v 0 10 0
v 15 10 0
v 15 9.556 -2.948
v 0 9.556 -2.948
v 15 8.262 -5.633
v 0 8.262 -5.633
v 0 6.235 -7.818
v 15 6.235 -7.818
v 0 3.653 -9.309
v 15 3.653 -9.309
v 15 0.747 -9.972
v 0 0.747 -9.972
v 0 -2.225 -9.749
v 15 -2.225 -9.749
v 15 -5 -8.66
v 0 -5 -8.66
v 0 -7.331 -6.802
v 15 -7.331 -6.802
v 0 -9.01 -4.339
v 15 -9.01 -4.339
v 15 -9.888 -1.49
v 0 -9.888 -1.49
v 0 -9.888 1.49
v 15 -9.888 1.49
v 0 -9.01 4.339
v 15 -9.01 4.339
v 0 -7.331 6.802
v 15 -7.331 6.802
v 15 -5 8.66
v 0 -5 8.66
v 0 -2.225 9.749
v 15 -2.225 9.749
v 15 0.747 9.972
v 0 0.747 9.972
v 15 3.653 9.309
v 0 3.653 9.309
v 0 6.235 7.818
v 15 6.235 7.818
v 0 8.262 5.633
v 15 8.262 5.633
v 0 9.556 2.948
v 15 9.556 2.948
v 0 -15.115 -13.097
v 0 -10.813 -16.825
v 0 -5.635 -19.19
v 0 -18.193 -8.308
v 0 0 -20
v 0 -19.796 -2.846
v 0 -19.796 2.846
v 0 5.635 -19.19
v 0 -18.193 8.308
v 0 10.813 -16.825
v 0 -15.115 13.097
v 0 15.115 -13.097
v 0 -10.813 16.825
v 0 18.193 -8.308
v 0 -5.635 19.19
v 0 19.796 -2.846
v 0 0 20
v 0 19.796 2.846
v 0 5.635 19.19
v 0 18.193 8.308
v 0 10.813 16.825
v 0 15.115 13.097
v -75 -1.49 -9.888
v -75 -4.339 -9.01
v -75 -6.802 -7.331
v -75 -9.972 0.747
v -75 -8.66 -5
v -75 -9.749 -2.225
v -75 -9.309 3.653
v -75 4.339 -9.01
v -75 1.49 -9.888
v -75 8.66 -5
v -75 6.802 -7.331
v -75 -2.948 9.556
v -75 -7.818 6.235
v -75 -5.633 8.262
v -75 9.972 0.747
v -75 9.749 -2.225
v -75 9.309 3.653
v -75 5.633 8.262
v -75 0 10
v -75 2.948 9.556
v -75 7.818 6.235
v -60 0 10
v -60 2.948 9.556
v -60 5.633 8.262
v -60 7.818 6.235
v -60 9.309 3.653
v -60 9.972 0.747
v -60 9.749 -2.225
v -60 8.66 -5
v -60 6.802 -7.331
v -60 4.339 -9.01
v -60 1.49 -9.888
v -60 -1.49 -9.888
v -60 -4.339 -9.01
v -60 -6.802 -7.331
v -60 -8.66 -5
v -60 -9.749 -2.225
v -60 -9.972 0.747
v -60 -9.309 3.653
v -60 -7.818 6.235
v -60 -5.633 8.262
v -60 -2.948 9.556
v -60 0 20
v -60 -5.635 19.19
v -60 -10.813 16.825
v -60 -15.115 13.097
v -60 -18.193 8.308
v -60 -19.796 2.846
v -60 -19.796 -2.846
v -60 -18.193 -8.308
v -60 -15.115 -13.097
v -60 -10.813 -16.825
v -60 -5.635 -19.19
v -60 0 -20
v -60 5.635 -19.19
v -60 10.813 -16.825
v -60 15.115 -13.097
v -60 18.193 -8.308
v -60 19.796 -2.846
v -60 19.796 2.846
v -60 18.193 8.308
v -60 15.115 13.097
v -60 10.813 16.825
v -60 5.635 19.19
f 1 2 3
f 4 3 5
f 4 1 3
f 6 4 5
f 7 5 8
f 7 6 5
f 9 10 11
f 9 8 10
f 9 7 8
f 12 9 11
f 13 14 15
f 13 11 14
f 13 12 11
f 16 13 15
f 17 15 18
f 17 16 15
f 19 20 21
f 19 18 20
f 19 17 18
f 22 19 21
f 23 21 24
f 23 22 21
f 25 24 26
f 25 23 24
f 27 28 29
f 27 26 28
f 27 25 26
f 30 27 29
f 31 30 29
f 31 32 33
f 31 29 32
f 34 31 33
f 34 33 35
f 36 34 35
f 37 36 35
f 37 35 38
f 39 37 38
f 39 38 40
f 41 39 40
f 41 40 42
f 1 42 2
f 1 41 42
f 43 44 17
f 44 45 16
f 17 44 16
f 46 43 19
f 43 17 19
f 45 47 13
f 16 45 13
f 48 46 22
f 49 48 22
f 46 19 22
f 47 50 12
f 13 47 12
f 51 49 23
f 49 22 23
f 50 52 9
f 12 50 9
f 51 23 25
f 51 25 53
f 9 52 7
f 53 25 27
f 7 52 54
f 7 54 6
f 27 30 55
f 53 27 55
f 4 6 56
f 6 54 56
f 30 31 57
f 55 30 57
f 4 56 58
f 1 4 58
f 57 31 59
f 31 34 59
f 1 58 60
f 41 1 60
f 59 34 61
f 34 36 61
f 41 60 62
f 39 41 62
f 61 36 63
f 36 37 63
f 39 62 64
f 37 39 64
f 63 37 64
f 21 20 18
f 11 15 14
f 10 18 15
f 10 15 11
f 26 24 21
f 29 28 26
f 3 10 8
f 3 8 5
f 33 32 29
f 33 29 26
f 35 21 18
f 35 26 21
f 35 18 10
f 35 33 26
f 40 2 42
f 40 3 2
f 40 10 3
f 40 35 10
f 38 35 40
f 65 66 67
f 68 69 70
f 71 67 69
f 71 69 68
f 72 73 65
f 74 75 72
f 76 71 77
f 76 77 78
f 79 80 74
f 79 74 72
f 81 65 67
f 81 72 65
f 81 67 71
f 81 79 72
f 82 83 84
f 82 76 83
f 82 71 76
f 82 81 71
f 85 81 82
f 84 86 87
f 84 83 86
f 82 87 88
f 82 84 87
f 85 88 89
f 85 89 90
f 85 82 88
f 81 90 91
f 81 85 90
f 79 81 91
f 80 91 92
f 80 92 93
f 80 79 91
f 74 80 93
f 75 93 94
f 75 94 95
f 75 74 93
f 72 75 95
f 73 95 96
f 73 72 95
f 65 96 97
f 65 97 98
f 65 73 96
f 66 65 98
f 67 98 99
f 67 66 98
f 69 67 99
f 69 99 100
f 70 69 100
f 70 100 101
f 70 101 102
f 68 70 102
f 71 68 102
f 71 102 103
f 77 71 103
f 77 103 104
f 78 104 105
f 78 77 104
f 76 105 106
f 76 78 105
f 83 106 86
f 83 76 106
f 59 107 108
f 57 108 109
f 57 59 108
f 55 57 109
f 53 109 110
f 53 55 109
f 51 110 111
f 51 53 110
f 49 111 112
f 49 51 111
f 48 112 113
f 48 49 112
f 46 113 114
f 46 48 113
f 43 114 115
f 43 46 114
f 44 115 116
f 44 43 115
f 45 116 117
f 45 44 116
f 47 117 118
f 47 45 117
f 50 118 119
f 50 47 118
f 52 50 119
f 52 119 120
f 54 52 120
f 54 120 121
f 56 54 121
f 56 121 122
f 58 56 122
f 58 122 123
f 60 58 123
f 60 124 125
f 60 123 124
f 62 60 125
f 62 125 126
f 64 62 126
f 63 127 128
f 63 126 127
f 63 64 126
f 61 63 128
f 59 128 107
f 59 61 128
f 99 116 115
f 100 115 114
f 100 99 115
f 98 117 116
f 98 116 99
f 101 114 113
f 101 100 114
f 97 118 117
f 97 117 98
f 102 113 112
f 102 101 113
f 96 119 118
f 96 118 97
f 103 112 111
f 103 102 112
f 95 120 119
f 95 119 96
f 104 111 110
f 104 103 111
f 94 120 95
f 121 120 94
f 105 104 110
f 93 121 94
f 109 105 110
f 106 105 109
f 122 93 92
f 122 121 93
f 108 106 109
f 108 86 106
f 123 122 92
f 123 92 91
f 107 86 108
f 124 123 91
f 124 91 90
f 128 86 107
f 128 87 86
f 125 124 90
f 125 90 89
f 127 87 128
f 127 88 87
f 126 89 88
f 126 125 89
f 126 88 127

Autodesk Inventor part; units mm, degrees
ref_plane "YZ Plane" through (0, 0, 0) normal (1, 0, 0) x (0, 1, 0)
ref_plane "XZ Plane" through (0, 0, 0) normal (0, 1, 0) x (-1, 0, 0)
ref_plane "XY Plane" through (0, 0, 0) normal (0, 0, 1) x (1, 0, 0)
sketch "Sketch2" plane through (0, 0, 0) normal (1, 0, 0) x (0, 1, 0)
  circle A0 centre (0, 0) radius 10
  dimension "d5" = 20
extrude "Extrusion2" add sketch "Sketch2" along normal blind 15
sketch "Sketch3" plane through (0, 0, 0) normal (-1, 0, 0) x (0, 0, 1)
  circle A0 centre (0, 0) radius 20
  dimension "d8" = 40
extrude "Extrusion3" add sketch "Sketch3" along normal blind 90
sketch "Sketch4" plane through (-90, 0, 0) normal (-1, 0, 0) x (0, 0, 1)
  circle A0 centre (0, 0) radius 20 projected
  circle A1 centre (0, 0) radius 10
  circle A2 centre (0, 0) radius 10 projected
  circle A3 centre (0, 0) radius 20
  dimension "d11" = 20
  dimension "d12" = 40
extrude "Extrusion4" cut sketch "Sketch4" against normal blind 30
sketch "Sketch5" plane through (-90, 0, 0) normal (-1, 0, 0) x (0, 0, 1)
  circle A0 centre (0, 0) radius 10
extrude "Extrusion5" cut sketch "Sketch5" against normal blind 15
equation "\"BendRadius\" = Thickness"
equation "\"BendReliefWidth\" = Thickness"
equation "\"BendReliefDepth\" = 0.5 * Thickness"
equation "\"CornerReliefSize\" = 4 * Thickness"
equation "\"MinimumRemnant\" = 2 * Thickness"
equation "\"TransitionRadius\" = BendRadius"
equation "\"JacobiRadiusSize\" = BendRadius"
equation "\"GapSize\" = Thickness"
equation "\"Thickness\" = 0.5"
properties part number "pin2vathmida" material "Bronze, Soft Tin"
